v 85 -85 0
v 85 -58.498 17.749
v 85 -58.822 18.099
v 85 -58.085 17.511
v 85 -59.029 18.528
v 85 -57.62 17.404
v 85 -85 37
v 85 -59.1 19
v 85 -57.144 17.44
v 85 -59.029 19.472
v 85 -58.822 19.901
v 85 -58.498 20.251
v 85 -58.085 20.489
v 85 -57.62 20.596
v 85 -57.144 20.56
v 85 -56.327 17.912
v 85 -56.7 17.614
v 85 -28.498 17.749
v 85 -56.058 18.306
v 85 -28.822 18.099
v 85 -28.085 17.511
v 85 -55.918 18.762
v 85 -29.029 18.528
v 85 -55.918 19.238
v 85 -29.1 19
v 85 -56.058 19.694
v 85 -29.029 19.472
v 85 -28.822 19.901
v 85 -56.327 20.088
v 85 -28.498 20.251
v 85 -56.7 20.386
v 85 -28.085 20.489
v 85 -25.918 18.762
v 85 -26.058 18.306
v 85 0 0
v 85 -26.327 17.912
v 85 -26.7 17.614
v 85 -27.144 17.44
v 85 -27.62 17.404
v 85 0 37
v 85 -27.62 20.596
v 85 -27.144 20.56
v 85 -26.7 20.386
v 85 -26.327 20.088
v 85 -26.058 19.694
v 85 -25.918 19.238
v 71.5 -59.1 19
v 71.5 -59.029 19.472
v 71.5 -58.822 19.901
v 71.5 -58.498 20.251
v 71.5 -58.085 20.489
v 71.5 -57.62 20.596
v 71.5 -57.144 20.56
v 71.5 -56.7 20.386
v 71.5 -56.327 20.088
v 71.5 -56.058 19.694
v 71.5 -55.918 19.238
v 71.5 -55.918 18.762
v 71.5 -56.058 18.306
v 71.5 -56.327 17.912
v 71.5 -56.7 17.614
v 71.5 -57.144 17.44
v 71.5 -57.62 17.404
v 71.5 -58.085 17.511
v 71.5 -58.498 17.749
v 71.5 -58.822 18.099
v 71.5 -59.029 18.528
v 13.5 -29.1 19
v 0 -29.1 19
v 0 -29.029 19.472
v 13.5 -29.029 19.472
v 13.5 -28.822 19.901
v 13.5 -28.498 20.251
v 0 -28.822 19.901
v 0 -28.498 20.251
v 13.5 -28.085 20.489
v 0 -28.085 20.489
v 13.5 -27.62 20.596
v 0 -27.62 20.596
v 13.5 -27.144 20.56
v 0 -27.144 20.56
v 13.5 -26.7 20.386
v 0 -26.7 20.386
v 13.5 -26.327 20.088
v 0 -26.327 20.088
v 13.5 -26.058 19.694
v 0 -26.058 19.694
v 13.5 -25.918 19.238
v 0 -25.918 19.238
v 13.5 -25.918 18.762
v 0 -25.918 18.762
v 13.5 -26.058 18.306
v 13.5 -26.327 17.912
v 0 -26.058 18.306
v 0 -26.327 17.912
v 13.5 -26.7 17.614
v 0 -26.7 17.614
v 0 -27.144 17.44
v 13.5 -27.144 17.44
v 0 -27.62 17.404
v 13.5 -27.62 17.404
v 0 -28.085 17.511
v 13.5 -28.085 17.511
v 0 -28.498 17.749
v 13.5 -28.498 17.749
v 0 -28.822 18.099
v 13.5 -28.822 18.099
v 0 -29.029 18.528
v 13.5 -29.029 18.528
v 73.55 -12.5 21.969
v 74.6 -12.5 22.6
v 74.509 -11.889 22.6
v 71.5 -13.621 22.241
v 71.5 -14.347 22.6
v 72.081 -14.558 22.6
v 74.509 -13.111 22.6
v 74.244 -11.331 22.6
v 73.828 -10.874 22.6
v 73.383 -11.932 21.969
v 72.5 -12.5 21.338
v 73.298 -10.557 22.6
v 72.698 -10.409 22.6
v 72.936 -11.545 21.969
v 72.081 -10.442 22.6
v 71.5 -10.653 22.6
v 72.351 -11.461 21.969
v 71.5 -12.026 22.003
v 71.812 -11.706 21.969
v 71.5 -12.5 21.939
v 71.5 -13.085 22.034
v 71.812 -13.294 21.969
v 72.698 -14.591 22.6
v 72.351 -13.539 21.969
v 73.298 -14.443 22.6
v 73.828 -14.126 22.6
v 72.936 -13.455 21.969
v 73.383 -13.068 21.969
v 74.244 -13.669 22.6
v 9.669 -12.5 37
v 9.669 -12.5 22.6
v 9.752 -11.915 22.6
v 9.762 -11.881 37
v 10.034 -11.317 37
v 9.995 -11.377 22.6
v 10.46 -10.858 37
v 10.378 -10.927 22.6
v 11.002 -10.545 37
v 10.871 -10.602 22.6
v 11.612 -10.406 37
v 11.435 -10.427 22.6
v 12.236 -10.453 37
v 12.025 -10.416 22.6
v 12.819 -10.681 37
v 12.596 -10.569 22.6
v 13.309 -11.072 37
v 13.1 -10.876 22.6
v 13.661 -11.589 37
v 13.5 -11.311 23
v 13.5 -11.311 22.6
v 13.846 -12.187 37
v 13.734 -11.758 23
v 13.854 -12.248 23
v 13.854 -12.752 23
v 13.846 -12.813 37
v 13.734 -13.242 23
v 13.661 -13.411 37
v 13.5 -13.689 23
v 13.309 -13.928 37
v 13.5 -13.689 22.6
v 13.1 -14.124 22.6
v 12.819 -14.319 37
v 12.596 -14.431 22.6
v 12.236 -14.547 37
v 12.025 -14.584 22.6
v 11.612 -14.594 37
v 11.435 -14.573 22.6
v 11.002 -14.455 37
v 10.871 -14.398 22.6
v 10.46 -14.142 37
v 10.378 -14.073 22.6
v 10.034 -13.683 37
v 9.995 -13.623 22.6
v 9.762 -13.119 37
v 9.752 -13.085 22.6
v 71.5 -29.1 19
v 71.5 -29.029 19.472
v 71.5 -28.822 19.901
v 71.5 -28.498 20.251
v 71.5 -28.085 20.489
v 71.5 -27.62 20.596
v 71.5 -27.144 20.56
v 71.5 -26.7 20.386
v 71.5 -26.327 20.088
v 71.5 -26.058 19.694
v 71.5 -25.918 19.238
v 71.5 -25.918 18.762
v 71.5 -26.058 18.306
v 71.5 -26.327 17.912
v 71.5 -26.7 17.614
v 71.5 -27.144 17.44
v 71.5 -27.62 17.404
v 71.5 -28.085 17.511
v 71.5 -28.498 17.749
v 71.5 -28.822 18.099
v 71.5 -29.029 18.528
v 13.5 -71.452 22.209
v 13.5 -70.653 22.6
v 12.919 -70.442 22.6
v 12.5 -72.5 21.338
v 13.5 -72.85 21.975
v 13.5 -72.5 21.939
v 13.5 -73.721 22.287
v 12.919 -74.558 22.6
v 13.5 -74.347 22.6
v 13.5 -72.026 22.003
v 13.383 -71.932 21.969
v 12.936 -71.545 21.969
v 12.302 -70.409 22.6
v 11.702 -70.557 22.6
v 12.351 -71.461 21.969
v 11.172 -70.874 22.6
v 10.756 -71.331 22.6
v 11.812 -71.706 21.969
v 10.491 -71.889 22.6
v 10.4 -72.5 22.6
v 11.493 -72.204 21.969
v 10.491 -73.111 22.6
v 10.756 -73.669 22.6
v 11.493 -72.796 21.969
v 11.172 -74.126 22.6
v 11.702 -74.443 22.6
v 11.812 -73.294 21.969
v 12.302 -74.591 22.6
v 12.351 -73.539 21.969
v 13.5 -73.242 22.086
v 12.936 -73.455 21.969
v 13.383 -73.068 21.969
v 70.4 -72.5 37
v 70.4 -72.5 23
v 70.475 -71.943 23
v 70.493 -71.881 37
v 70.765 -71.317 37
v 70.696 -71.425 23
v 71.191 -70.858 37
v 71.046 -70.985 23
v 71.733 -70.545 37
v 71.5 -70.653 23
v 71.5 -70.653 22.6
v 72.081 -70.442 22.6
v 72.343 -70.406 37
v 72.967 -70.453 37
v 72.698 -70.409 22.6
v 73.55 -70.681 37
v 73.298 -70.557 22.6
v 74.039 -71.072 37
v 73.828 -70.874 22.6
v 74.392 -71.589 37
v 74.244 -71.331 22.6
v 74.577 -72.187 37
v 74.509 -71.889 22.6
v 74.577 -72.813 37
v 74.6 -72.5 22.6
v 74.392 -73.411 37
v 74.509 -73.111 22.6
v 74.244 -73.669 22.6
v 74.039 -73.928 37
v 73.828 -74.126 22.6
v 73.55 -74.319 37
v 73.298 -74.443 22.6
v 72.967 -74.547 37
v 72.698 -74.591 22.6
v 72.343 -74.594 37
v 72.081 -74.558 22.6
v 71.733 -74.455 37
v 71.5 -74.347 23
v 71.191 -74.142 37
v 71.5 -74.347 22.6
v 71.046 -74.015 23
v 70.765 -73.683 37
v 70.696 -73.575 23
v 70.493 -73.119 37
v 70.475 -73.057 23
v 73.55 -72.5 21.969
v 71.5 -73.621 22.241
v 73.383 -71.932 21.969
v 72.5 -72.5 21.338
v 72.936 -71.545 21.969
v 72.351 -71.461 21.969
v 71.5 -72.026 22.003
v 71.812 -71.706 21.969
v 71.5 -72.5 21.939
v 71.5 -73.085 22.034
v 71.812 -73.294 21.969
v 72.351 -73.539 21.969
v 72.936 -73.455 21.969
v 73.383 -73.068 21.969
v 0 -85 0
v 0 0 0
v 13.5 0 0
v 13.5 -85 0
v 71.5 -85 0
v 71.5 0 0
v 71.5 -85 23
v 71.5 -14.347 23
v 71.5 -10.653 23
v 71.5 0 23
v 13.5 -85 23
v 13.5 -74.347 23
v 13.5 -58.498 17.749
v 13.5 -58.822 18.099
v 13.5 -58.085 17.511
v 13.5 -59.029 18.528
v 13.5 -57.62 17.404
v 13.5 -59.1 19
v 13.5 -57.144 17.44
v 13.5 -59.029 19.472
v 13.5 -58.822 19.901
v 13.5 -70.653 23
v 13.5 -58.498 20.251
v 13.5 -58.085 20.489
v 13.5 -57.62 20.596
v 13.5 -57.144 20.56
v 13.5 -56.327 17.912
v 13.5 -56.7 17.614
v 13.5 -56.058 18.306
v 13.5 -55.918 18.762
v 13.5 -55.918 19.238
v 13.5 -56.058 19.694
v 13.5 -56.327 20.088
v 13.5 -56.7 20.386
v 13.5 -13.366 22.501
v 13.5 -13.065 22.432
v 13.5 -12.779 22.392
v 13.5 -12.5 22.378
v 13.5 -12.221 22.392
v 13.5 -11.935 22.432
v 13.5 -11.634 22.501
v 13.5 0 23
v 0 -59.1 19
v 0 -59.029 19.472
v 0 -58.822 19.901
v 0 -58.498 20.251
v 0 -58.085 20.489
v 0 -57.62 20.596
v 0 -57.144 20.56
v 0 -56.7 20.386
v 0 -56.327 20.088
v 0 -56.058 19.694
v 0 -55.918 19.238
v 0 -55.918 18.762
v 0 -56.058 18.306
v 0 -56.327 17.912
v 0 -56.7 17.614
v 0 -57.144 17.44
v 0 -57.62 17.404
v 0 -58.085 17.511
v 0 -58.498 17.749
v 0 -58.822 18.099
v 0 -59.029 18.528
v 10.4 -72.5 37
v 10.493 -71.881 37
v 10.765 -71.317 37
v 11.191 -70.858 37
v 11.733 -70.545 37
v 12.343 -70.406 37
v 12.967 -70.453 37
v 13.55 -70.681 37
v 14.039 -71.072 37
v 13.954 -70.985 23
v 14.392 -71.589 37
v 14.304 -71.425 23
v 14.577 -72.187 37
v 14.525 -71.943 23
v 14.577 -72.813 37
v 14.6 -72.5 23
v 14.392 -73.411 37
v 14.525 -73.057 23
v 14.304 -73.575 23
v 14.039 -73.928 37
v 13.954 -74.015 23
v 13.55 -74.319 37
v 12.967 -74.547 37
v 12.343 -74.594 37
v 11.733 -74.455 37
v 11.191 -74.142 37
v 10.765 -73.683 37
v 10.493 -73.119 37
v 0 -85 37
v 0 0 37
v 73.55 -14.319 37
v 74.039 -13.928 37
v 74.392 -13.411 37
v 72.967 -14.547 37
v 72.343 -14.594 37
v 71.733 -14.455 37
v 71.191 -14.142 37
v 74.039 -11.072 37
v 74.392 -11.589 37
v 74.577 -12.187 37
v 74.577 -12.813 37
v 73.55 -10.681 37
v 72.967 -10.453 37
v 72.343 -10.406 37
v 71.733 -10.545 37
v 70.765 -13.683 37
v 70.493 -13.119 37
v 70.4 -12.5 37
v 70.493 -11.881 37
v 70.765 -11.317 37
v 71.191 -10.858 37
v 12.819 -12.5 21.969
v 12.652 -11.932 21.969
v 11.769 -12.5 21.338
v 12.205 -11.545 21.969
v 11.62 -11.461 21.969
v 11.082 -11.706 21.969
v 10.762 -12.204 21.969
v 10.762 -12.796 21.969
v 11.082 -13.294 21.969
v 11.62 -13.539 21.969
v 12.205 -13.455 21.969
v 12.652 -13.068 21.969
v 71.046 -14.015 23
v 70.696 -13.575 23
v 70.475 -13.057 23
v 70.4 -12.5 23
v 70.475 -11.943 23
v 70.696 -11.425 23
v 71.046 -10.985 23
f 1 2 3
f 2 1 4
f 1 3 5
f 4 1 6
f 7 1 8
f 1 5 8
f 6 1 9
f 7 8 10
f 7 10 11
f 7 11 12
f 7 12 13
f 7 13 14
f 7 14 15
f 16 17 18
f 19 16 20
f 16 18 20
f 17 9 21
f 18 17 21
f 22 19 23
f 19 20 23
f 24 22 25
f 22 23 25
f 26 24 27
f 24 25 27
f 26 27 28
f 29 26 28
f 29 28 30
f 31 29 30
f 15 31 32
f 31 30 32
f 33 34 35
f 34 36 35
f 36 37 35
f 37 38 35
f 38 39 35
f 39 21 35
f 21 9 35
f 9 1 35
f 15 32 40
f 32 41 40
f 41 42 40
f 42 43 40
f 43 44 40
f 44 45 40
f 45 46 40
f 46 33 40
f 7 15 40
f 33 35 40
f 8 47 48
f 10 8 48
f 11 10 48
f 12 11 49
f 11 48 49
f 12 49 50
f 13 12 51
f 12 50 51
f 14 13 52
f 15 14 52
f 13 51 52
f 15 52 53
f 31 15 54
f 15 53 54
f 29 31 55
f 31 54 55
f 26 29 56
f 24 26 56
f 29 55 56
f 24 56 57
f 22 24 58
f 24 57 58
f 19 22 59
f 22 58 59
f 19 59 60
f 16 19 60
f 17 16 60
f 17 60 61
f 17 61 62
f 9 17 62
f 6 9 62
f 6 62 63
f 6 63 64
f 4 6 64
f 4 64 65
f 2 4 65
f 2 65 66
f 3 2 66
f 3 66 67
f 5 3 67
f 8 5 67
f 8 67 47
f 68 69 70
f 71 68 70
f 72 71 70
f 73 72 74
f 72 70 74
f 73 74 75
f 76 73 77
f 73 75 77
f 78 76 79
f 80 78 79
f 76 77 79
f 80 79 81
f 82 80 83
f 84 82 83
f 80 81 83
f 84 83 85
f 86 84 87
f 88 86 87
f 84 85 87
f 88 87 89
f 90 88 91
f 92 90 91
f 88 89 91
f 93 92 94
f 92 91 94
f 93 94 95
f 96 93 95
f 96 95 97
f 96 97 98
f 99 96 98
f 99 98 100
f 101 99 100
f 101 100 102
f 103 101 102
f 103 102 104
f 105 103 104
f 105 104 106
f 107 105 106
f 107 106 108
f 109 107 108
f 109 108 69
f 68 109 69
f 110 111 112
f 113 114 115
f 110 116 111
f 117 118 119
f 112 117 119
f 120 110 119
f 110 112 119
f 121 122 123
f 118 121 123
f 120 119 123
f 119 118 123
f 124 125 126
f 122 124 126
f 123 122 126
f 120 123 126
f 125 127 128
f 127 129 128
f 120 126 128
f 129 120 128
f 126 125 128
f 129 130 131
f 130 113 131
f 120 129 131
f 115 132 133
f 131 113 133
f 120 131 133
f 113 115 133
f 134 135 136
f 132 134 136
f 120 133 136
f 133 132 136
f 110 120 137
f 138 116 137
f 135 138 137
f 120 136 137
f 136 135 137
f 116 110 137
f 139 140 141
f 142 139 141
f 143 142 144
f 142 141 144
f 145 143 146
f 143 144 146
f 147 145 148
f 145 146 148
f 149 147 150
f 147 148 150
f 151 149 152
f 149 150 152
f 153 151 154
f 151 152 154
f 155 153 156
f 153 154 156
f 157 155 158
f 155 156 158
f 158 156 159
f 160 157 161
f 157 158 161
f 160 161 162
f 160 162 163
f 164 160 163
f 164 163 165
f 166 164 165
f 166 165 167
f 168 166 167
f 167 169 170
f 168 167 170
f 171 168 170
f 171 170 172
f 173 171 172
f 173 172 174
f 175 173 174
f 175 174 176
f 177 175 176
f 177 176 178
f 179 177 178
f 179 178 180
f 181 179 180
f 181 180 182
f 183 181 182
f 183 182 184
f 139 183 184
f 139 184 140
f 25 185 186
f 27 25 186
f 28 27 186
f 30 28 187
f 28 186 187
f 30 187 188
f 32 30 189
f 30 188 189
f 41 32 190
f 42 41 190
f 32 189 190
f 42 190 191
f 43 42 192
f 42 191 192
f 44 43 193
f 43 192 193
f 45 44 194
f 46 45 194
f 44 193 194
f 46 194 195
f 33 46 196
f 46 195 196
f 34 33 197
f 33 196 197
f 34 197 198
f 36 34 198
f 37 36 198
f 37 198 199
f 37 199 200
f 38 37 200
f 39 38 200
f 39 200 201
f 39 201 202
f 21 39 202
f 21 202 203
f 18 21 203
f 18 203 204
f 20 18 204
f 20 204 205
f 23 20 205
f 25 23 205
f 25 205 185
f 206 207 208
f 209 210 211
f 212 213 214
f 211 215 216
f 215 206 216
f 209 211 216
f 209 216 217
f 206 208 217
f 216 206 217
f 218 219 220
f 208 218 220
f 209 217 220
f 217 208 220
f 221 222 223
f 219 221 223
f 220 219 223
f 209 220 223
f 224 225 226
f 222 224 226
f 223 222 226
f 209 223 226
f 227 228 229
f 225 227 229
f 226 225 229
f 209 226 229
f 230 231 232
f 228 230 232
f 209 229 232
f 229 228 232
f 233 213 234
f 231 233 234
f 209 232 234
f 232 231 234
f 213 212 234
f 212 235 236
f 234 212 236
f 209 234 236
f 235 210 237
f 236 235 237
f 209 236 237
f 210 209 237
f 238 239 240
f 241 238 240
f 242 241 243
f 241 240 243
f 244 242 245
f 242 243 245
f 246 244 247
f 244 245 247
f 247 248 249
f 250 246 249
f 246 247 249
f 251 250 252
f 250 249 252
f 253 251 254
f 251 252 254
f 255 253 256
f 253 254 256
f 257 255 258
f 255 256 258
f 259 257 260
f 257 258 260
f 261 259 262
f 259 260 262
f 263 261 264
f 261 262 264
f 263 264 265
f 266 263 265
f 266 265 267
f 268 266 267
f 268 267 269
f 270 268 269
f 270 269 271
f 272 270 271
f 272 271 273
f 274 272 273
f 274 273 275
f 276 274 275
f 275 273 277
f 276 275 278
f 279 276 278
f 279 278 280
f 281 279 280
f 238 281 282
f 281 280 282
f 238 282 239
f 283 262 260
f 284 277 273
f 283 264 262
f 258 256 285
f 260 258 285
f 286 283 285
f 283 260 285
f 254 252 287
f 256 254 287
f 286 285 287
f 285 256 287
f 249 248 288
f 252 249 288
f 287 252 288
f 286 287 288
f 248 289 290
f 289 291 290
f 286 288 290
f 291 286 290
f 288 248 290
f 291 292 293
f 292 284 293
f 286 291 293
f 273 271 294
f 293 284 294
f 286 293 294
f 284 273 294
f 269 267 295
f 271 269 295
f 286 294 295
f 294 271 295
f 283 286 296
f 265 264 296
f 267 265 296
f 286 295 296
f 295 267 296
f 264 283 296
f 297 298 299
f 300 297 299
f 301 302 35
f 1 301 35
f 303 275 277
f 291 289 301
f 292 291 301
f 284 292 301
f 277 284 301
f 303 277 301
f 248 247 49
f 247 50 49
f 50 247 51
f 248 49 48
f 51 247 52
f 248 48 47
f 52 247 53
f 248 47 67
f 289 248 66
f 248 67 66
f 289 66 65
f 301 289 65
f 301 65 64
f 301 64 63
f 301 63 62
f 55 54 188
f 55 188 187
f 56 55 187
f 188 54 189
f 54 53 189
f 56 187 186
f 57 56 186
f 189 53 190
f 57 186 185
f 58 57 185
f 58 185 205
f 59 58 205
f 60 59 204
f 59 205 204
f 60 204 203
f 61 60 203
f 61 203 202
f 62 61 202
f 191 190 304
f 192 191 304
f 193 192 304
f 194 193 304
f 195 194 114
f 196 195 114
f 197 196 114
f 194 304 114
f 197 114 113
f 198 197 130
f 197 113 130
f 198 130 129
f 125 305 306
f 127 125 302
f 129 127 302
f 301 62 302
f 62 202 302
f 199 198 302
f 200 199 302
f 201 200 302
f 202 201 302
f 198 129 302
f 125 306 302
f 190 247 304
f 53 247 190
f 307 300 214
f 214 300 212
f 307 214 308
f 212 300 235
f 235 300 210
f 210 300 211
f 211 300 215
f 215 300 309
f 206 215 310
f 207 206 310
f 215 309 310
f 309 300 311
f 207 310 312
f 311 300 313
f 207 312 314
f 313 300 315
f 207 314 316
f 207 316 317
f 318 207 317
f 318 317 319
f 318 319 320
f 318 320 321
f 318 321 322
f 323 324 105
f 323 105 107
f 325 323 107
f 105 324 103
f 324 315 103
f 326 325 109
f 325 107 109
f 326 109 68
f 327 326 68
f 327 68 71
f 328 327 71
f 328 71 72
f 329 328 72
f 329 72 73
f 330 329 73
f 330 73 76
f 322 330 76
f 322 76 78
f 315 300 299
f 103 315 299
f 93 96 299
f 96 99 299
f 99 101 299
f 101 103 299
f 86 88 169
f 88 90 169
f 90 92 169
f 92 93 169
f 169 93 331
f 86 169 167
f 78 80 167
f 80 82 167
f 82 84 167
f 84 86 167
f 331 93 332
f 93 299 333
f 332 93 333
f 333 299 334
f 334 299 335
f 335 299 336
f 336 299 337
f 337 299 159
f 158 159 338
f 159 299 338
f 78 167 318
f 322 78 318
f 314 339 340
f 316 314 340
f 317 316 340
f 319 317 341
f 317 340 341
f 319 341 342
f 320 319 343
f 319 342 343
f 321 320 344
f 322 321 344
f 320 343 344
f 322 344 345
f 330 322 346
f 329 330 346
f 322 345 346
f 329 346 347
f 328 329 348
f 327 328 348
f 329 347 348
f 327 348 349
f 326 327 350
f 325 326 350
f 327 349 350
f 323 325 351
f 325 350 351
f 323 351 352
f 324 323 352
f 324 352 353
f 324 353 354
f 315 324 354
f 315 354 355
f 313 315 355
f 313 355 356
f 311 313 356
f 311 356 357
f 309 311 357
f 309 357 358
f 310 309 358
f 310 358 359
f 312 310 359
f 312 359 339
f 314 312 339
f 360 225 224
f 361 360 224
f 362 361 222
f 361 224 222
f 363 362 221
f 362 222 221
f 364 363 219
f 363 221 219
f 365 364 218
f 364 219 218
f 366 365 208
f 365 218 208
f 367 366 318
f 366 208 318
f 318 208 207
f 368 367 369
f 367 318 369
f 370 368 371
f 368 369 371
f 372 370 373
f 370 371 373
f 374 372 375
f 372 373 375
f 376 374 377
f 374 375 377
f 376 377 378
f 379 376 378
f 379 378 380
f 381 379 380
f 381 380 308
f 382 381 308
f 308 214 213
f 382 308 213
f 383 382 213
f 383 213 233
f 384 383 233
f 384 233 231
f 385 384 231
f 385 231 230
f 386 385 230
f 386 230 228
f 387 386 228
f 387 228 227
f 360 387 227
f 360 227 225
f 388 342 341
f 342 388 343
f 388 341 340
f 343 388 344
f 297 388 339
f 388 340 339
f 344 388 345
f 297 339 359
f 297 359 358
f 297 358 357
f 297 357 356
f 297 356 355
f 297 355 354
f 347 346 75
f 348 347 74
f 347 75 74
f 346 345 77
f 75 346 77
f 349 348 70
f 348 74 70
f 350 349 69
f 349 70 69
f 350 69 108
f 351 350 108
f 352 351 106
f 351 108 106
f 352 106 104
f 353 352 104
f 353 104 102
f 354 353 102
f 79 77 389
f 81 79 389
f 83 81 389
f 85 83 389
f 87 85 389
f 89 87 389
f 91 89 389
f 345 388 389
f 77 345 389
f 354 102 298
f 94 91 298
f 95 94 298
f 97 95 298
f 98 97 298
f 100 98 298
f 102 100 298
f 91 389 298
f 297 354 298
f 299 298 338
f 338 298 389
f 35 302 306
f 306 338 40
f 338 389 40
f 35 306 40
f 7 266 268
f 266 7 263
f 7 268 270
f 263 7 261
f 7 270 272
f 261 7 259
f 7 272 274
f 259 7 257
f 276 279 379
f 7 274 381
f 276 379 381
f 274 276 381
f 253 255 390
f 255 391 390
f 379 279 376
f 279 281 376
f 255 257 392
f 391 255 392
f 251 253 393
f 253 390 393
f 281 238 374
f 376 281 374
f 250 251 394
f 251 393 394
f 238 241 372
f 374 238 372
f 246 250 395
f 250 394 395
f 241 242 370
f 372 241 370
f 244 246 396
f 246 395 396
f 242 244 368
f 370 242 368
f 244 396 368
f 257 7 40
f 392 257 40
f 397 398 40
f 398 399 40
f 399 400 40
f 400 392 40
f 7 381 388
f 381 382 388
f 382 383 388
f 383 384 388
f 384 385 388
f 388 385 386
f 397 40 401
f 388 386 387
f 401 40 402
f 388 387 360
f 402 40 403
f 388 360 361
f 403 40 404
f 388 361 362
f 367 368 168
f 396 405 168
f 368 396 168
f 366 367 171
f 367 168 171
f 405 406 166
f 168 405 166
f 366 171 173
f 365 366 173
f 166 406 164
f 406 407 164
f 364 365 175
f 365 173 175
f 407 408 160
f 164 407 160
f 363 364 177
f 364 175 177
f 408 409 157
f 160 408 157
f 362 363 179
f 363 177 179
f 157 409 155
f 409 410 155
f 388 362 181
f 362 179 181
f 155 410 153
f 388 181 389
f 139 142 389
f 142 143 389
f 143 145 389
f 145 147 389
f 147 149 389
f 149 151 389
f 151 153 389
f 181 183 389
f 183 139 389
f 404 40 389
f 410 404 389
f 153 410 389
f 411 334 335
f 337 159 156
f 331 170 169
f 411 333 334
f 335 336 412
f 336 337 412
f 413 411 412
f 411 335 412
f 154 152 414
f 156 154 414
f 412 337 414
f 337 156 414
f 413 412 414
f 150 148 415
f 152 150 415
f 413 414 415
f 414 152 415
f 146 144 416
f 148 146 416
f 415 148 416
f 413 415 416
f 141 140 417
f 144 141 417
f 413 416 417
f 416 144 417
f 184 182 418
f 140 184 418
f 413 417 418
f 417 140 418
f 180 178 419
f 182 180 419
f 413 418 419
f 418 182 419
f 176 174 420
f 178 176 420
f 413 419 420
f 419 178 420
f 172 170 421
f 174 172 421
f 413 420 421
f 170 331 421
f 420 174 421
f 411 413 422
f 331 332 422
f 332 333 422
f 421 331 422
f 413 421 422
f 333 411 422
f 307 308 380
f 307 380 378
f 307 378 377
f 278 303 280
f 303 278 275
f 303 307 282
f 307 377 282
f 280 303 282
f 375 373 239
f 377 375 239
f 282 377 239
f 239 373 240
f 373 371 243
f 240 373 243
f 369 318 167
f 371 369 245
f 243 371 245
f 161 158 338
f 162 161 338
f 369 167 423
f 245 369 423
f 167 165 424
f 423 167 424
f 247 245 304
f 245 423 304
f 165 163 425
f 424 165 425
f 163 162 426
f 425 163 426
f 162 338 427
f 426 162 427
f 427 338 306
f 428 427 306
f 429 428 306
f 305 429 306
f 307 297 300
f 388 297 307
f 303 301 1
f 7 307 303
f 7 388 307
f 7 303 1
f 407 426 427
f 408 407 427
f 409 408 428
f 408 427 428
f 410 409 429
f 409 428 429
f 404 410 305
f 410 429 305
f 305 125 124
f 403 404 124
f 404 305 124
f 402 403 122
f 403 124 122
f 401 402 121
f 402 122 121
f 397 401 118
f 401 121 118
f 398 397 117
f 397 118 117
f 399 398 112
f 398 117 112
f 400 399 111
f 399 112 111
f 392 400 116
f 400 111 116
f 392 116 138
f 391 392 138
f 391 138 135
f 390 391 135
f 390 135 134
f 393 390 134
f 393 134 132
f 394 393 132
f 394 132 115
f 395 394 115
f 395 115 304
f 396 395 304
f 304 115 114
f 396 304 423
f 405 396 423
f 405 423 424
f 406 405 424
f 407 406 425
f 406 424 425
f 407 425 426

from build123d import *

# Parameters (mm, degrees)
F1_DEPTH = 85
F3_D     = 4.2
F3_DEPTH = 14.4
F3_TIP   = 1.2618073
F5_D     = 3.2


with BuildPart() as f1:
    # F0 (on Front) → F1 (new body)
    with BuildSketch(Plane.XZ):
        Polygon((0, 37), (0, 0), (13.5, 0), (13.5, 23), (71.5, 23), (71.5, 0), (85, 0), (85, 37), align=None)
    extrude(amount=F1_DEPTH)

    # F3
    with Locations(Plane.XY.offset(37)):
        with Locations((11.7691496318, -12.5), (72.5, -12.5), (72.5, -72.5), (12.5, -72.5)):
            Hole(F3_D / 2, depth=F3_DEPTH)
            with Locations((0, 0, -(F3_DEPTH + F3_TIP / 2))):  # 118° drill point
                Cone(0, F3_D / 2, F3_TIP, mode=Mode.SUBTRACT)

    # F5 (through all)
    with Locations(Plane.YZ.offset(85)):
        with Locations((-57.5, 19), (-27.5, 19)):
            Hole(F5_D / 2)


solid = f1.part
